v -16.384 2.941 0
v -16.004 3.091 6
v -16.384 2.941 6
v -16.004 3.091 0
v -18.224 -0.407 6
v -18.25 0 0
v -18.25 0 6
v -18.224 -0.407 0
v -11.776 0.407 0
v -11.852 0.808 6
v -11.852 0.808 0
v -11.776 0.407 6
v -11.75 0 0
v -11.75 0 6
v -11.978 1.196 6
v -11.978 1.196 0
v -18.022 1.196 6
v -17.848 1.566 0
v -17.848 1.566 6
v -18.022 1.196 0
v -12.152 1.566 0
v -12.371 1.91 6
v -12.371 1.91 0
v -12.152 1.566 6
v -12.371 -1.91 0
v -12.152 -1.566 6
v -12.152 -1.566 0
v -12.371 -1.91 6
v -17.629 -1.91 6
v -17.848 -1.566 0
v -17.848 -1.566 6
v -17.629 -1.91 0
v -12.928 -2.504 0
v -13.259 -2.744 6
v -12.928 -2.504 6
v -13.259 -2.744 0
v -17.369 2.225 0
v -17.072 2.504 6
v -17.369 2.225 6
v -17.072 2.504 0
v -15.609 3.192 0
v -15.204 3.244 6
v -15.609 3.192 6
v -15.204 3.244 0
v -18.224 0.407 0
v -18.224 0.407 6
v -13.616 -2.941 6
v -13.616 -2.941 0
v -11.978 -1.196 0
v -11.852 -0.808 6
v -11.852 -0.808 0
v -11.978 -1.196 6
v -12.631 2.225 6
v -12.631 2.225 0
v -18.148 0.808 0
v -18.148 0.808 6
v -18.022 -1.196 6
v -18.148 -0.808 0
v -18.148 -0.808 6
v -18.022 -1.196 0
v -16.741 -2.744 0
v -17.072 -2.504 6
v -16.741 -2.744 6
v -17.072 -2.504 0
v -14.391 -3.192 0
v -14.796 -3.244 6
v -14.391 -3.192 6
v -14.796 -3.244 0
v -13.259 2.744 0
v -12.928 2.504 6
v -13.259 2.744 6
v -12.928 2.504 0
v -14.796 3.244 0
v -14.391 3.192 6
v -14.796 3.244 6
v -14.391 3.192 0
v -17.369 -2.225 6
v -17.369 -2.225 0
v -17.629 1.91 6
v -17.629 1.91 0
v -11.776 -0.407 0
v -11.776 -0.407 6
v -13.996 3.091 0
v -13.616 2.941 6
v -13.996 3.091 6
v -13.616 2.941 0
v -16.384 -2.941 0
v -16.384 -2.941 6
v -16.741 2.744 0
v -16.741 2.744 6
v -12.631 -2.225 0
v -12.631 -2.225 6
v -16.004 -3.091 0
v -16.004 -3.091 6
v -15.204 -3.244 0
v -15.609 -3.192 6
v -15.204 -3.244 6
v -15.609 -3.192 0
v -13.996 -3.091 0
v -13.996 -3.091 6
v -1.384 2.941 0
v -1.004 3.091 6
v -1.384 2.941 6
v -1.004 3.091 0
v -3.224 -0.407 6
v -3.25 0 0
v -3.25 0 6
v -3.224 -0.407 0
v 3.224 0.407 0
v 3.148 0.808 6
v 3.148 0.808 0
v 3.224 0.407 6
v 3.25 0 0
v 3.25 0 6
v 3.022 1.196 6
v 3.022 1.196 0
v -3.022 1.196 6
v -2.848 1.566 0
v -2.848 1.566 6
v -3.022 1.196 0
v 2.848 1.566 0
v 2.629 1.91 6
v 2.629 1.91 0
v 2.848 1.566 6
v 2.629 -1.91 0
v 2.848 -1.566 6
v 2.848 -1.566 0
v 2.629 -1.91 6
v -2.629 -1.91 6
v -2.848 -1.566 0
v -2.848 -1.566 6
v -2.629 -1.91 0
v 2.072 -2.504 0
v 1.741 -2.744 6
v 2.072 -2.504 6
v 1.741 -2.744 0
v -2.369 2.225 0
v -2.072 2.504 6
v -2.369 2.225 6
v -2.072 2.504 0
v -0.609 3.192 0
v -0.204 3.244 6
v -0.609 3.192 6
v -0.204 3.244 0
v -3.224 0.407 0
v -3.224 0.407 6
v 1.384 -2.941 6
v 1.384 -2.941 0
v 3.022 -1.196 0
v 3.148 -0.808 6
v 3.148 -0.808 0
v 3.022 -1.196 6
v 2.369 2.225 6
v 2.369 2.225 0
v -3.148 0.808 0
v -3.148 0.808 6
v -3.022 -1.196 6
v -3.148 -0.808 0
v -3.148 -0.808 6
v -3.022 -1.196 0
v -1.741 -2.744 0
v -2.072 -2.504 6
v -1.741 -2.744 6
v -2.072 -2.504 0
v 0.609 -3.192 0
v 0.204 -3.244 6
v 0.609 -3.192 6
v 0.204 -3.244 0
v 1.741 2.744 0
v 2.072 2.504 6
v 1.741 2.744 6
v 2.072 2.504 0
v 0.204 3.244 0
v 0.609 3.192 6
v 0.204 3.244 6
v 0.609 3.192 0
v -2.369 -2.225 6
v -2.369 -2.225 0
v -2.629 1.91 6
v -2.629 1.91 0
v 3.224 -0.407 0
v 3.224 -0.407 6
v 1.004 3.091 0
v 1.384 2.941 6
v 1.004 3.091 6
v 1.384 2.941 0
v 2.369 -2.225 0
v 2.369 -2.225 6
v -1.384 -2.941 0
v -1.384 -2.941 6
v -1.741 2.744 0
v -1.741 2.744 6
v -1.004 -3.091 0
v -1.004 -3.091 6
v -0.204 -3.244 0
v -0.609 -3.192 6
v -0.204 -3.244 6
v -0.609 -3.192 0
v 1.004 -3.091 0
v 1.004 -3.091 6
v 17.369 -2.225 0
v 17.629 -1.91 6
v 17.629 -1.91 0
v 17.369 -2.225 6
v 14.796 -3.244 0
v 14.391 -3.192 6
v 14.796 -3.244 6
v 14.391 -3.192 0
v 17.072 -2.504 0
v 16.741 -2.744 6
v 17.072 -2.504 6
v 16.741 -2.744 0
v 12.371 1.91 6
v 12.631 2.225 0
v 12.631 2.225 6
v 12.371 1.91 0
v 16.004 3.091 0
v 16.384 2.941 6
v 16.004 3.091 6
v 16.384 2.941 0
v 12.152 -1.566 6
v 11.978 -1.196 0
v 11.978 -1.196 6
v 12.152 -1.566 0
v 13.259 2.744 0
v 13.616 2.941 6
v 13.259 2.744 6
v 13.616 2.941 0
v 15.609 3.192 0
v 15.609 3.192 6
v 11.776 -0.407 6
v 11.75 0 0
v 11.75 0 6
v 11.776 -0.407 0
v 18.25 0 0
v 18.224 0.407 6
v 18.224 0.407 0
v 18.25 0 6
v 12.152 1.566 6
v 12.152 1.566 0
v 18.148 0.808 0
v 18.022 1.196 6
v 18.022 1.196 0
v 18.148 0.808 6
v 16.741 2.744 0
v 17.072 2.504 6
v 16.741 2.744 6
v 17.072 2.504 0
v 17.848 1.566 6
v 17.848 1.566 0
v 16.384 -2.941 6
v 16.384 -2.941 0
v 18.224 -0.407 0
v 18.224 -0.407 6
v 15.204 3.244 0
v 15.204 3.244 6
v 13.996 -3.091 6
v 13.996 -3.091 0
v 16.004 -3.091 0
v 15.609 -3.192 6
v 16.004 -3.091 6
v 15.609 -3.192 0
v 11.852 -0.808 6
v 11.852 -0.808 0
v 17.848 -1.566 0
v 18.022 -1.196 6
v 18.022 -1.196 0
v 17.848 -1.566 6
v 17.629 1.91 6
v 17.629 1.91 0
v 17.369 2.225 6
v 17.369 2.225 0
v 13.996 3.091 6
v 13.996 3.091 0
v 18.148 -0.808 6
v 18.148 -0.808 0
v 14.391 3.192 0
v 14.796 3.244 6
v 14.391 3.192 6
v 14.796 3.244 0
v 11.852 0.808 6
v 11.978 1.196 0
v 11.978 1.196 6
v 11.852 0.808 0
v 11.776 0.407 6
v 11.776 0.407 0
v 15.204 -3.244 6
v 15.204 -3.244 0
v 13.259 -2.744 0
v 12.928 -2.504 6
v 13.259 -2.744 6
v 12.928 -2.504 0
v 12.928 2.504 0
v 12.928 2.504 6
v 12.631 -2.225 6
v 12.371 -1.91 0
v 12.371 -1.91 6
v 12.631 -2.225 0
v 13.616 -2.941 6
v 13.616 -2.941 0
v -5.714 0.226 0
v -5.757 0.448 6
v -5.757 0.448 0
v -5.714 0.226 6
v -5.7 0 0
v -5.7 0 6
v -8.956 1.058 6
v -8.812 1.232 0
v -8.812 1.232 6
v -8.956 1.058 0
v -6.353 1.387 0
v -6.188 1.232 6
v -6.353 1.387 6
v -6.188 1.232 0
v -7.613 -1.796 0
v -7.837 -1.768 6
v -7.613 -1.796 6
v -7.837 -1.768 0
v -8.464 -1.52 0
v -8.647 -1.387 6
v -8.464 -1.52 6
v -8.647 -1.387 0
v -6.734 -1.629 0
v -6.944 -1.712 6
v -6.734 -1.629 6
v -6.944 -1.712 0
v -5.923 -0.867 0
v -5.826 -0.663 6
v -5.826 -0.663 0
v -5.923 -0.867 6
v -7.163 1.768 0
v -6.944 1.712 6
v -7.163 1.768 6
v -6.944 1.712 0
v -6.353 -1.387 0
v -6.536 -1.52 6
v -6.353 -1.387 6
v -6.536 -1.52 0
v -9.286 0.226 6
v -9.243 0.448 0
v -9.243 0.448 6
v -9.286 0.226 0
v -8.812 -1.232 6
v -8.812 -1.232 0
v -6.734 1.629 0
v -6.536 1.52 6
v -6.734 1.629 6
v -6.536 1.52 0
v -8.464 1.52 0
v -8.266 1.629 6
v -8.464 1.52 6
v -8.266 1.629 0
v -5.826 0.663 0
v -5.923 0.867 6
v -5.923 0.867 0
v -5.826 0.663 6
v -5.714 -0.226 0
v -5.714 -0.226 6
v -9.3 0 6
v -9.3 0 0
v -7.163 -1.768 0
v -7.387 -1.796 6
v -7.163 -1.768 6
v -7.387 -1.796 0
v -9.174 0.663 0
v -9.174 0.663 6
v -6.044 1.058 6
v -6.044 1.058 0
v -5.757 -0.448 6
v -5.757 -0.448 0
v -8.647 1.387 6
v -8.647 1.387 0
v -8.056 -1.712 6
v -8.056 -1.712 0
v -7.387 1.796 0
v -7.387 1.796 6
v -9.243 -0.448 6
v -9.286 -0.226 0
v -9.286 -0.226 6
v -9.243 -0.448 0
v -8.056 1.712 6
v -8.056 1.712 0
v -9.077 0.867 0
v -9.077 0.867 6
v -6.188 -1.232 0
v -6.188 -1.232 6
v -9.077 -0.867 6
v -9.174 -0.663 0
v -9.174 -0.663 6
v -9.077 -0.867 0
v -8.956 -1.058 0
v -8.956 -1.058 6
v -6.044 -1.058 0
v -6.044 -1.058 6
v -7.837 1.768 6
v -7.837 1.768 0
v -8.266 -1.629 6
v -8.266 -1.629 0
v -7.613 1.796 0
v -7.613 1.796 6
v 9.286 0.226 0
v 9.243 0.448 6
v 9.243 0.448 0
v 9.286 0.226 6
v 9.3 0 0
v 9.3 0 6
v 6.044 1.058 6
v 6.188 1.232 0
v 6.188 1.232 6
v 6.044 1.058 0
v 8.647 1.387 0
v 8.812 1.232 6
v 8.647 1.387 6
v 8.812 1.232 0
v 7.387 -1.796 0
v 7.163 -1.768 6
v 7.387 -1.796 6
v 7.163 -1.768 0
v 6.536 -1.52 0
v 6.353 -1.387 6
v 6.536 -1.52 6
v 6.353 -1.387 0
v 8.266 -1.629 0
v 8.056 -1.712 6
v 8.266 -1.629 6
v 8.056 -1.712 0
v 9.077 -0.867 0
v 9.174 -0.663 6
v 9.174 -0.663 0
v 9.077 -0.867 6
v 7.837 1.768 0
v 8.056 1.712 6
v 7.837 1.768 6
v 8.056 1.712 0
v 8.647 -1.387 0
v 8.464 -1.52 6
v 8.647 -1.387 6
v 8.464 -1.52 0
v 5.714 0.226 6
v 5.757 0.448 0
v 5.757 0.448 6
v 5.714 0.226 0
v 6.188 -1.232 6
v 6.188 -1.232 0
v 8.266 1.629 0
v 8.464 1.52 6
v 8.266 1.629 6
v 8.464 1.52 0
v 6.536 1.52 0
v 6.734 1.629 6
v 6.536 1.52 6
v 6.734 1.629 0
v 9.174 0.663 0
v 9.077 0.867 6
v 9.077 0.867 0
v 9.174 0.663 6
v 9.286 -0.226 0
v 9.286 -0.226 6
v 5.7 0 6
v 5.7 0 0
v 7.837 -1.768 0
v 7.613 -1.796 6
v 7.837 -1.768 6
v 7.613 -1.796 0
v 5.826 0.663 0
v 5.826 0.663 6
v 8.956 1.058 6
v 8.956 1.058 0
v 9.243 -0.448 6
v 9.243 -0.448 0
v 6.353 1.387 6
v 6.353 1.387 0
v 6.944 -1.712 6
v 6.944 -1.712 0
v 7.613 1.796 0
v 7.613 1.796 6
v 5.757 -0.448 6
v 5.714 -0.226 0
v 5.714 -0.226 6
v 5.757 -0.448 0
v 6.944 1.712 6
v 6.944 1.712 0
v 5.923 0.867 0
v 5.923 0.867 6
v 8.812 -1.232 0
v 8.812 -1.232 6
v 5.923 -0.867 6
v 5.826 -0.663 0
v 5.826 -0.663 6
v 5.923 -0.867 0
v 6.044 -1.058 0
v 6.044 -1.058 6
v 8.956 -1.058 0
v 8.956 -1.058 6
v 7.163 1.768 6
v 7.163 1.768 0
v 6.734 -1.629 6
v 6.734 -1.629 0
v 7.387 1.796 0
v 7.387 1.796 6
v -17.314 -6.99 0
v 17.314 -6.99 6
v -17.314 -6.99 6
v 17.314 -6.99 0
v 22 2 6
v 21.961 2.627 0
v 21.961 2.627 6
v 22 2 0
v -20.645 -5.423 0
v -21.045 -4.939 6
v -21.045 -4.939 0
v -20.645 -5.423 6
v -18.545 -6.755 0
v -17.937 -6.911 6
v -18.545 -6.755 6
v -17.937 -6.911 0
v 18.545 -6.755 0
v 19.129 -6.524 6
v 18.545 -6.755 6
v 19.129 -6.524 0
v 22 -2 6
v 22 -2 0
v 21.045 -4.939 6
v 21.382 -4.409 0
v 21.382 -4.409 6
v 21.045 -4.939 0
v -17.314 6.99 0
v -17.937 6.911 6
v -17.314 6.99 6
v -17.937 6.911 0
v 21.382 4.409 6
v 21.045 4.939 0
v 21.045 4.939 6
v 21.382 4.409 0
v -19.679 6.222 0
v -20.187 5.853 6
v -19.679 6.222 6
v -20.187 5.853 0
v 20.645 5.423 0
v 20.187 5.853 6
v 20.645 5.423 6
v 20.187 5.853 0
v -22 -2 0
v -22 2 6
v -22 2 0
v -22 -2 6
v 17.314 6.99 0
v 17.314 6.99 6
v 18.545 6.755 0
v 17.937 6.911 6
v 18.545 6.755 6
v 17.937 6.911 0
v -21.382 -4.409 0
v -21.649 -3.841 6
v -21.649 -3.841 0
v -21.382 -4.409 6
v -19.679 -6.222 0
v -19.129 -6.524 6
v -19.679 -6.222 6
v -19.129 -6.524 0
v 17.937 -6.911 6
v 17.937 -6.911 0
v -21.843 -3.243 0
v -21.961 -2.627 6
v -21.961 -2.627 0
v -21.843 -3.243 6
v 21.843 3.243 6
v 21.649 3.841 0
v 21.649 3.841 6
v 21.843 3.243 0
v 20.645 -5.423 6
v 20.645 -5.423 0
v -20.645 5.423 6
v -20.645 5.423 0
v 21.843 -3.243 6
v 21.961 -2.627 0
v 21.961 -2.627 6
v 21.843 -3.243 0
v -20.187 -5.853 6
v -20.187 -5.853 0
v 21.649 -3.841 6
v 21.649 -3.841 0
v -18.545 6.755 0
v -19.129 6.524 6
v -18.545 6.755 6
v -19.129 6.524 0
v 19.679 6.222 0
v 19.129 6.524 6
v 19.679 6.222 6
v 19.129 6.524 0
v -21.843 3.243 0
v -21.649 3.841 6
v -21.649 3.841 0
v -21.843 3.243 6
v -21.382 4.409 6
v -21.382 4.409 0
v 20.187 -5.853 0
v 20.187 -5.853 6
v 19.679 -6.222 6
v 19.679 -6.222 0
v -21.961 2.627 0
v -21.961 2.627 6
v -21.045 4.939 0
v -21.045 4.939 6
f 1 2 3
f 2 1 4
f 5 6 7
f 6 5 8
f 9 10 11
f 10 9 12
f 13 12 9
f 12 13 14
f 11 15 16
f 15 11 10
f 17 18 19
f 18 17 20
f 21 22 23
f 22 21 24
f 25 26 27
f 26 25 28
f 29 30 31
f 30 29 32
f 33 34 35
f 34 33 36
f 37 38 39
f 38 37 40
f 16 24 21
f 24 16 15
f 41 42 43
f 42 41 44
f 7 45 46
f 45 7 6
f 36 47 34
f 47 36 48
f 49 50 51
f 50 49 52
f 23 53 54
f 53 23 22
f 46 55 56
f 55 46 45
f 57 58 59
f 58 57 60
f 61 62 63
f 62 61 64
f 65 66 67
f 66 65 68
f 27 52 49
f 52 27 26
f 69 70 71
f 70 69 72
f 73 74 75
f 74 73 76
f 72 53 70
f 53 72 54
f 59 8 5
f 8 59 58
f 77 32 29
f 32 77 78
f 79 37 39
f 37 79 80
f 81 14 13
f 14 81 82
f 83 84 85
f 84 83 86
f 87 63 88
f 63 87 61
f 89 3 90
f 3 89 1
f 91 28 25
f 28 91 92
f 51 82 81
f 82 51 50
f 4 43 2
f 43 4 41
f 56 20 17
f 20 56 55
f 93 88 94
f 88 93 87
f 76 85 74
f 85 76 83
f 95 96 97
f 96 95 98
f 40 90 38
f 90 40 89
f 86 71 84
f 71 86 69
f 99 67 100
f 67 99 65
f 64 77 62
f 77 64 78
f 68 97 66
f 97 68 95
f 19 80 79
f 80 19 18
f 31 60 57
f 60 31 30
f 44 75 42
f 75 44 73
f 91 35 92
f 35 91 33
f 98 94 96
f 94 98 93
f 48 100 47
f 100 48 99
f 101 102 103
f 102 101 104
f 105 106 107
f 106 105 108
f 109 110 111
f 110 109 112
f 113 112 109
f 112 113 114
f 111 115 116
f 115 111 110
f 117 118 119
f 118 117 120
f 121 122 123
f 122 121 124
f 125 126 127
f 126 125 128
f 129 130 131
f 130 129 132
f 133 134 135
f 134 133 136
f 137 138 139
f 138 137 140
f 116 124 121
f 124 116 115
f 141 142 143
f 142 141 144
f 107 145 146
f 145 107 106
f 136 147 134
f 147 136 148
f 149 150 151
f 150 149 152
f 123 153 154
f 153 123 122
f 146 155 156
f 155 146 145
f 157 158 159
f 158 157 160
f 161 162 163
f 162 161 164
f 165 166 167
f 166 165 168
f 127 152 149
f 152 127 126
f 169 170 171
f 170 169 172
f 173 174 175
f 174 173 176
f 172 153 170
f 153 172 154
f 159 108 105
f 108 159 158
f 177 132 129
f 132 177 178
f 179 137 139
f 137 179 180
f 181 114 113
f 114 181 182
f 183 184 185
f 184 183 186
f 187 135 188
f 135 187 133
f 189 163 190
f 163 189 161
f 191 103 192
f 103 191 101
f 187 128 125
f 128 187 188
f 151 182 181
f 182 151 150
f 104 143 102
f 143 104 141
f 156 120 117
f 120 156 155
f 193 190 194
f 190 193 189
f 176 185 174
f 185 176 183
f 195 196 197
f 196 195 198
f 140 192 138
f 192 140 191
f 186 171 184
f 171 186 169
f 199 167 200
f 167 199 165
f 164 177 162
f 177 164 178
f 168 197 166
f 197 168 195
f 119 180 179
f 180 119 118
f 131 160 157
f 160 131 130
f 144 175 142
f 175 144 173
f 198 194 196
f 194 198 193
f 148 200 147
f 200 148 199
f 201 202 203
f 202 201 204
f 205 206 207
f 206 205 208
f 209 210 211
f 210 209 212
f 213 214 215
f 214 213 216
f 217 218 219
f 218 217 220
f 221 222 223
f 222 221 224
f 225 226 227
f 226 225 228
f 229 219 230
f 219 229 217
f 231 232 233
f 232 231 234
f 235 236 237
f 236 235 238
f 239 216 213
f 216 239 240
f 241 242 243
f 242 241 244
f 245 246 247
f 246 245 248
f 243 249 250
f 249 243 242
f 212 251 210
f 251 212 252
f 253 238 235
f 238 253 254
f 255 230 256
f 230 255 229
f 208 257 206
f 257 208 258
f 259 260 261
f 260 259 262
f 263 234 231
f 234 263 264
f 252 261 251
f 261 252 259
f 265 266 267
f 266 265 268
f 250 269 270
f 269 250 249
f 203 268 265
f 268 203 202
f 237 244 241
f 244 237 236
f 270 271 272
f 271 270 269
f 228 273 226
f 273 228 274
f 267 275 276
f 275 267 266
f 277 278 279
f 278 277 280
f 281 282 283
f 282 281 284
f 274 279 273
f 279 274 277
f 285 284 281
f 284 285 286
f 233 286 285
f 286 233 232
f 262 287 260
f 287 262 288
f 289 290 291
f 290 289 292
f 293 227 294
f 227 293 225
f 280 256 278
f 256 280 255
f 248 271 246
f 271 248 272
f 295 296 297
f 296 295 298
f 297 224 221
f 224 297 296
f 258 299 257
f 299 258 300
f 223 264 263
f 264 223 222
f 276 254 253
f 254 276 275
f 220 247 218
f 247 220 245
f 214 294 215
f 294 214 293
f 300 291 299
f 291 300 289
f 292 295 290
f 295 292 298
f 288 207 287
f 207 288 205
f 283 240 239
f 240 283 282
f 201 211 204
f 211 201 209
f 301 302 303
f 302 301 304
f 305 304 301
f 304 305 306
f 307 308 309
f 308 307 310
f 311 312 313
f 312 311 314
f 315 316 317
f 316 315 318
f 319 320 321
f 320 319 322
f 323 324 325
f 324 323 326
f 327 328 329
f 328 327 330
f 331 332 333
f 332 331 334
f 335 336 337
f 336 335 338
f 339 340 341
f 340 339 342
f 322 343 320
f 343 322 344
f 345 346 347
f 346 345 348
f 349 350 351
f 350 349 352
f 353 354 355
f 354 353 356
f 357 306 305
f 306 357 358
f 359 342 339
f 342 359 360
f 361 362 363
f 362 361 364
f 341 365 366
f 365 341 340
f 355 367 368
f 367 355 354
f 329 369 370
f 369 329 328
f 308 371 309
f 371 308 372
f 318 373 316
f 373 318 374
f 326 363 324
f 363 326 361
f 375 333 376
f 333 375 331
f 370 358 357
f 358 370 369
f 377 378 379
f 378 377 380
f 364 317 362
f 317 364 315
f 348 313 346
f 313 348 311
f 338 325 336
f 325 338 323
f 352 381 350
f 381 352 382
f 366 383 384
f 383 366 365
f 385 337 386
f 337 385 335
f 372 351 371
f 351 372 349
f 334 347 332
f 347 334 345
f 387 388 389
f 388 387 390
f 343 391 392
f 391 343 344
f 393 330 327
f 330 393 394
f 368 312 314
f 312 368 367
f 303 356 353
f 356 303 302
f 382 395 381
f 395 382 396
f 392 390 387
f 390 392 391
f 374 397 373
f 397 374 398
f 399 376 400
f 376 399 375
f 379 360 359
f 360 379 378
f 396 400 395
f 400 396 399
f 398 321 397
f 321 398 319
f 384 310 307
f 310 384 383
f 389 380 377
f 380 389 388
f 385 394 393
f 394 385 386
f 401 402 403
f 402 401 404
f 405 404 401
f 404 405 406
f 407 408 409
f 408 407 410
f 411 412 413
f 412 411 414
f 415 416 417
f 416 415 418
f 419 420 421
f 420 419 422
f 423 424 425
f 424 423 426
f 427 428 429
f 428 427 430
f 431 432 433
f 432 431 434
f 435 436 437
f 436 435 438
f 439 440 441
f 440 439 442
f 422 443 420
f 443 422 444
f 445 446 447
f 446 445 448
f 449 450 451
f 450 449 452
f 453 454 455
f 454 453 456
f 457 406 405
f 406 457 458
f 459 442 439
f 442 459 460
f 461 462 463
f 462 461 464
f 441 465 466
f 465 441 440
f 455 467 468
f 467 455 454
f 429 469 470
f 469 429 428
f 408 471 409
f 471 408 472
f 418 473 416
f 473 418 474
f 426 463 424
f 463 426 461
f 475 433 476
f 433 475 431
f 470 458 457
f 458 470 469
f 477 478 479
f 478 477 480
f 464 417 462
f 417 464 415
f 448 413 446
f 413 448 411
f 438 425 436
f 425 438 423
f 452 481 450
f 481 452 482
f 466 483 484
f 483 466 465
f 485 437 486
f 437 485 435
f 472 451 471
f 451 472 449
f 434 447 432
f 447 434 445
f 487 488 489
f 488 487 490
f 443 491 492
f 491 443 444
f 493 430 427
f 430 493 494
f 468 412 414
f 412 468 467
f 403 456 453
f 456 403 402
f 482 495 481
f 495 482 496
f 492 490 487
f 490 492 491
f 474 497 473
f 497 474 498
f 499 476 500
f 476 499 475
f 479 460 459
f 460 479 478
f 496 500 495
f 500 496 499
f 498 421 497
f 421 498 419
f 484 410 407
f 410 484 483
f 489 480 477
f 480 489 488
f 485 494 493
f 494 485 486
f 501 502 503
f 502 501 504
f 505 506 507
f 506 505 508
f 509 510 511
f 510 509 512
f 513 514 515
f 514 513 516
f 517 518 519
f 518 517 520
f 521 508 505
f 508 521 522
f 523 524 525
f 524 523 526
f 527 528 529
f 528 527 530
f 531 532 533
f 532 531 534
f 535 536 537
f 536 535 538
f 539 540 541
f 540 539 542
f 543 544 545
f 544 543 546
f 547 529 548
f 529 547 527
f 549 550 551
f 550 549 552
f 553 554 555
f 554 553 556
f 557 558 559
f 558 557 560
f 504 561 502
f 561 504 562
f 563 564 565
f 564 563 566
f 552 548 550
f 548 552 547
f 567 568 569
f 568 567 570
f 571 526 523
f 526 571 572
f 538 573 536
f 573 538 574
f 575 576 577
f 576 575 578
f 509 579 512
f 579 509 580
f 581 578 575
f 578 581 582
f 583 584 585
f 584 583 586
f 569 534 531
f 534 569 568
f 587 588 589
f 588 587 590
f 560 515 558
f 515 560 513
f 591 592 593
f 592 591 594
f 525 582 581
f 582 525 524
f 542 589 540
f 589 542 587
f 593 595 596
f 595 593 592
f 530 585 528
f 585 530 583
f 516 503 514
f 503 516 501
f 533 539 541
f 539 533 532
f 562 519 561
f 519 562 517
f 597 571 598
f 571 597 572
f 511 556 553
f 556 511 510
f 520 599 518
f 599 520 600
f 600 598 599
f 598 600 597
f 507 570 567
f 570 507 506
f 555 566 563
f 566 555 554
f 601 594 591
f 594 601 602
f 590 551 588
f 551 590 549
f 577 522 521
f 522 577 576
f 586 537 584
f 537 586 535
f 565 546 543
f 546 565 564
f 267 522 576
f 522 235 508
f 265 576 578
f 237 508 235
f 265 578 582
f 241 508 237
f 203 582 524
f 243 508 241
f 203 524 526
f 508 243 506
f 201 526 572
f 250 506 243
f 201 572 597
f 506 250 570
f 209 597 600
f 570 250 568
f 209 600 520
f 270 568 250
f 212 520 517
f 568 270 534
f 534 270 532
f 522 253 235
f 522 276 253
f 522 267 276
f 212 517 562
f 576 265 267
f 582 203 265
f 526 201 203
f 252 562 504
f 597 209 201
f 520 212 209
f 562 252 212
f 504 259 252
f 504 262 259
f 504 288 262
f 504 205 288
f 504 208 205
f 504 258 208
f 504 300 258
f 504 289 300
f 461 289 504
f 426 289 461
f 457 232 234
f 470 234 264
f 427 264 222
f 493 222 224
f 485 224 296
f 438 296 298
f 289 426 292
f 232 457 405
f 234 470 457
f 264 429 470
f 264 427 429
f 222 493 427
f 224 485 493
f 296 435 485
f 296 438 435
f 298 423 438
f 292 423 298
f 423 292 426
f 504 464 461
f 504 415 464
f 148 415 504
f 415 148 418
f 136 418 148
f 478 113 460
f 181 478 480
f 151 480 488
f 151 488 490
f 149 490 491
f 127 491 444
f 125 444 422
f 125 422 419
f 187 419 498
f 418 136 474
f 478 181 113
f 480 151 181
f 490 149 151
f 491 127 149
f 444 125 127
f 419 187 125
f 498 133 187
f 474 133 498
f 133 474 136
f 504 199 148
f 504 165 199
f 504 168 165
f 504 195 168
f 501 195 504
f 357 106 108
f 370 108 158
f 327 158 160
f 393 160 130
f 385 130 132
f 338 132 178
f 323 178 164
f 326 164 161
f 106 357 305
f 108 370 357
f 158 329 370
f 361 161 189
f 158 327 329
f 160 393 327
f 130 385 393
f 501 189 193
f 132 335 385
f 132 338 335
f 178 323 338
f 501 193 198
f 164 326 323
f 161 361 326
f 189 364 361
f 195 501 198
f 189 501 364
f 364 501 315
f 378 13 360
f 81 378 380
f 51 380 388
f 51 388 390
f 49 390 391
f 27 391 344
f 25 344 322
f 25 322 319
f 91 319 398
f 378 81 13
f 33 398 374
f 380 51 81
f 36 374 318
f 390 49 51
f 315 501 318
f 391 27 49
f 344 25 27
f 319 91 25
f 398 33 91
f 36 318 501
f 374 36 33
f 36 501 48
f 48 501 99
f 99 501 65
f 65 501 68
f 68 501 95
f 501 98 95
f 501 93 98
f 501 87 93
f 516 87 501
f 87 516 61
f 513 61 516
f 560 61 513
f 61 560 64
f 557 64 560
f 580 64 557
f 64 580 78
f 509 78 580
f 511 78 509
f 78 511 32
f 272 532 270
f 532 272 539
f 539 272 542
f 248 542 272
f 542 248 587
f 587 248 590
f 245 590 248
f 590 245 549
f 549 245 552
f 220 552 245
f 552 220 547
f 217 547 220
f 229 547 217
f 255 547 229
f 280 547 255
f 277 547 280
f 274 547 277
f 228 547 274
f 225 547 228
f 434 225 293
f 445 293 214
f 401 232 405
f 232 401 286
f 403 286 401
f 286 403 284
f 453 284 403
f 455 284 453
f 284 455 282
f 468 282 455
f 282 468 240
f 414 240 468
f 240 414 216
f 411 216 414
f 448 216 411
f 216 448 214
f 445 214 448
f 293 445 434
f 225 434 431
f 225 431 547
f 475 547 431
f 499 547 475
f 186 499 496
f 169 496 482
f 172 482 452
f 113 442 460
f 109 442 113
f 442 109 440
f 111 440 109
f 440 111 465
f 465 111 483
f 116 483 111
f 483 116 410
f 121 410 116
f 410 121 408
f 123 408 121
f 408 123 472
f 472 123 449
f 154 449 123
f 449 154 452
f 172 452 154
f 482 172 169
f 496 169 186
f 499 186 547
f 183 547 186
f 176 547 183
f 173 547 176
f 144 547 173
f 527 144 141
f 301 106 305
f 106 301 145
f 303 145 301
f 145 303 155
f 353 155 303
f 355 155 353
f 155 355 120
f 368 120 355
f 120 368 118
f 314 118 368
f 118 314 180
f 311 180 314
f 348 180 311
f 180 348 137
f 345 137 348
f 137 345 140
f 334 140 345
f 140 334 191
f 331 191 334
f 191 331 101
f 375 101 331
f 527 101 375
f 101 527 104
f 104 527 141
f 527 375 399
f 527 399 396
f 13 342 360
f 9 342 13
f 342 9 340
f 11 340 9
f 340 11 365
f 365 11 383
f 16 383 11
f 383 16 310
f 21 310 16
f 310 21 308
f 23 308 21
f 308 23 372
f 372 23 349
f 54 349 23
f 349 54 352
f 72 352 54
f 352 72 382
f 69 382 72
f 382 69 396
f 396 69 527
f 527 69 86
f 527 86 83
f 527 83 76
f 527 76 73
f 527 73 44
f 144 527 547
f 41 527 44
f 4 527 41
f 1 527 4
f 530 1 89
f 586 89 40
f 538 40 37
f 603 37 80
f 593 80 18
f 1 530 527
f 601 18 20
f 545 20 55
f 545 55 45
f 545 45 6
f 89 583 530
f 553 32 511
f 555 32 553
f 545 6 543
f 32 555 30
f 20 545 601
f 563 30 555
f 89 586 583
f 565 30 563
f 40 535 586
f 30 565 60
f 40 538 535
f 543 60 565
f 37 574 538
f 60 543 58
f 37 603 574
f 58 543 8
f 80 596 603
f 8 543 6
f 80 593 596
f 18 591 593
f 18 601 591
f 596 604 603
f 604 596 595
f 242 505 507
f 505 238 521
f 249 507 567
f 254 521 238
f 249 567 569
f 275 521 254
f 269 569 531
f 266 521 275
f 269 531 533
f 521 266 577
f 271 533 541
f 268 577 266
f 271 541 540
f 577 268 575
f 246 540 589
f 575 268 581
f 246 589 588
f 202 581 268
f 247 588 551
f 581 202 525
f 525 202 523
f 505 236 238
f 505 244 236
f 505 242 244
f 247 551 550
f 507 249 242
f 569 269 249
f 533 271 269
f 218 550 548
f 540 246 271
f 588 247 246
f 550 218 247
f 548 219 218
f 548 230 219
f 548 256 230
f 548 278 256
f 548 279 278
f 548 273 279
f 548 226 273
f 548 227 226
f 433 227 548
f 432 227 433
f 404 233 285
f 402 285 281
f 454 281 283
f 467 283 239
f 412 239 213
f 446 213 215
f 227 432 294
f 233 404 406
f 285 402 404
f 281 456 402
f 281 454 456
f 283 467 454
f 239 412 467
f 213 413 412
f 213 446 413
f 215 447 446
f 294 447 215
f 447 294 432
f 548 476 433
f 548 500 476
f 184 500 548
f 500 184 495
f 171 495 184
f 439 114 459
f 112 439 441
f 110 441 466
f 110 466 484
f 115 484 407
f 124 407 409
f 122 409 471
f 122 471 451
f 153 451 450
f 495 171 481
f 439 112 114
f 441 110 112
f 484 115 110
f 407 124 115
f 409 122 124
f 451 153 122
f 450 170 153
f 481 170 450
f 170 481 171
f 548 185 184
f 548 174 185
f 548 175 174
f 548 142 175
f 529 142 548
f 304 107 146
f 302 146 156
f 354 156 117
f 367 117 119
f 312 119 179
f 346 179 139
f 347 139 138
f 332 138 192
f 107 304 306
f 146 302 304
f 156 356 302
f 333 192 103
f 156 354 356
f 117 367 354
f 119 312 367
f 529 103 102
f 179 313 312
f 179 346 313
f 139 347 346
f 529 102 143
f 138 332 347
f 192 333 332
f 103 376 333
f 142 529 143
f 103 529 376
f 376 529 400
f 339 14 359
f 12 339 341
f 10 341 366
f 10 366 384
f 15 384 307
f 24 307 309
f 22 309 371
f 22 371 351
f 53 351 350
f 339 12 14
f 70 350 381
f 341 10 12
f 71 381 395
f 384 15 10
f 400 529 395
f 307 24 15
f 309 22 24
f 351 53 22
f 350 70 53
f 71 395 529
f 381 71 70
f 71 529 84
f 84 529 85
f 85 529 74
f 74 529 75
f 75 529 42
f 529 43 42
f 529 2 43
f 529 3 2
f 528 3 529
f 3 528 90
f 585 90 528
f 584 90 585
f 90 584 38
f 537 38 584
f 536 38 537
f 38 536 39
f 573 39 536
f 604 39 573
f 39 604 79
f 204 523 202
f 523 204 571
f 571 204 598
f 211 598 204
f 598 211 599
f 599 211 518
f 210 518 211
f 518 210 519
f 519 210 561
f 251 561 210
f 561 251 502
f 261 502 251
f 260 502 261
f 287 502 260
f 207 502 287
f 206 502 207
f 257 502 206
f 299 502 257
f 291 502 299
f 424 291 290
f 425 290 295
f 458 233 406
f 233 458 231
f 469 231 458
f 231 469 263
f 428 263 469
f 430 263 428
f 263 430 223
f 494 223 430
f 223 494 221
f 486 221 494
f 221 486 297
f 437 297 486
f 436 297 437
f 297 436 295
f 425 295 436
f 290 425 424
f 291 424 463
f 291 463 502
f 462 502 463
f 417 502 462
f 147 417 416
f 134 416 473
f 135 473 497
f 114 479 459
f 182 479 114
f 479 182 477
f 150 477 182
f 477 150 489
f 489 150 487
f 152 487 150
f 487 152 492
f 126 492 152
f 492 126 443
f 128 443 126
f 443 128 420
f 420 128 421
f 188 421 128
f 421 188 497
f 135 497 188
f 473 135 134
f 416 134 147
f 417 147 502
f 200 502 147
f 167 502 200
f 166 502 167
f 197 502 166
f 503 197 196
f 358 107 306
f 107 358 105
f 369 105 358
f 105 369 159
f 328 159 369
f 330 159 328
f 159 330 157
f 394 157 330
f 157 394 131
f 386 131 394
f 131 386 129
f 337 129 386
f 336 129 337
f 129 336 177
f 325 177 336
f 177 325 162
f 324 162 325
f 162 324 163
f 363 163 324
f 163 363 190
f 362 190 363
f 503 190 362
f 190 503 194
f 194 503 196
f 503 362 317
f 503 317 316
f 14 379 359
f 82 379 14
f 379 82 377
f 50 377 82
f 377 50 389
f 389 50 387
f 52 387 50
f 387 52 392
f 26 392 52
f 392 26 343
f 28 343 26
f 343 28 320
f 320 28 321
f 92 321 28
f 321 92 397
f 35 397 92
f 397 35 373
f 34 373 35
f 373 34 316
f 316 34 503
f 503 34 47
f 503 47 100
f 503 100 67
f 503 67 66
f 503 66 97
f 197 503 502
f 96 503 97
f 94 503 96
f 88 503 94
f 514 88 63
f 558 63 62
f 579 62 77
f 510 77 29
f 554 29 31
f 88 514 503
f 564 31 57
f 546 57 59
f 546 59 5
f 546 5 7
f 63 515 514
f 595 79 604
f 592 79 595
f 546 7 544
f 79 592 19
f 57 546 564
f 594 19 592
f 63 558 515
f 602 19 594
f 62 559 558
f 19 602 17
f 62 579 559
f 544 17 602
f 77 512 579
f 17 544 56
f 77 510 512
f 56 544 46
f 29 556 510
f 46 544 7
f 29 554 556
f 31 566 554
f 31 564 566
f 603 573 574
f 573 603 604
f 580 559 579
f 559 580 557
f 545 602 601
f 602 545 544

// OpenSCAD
$fn = 50;


difference() {
	union() {
		hull() {
			translate(v = [-17.0000000000, 2.0000000000, 0]) {
				cylinder(h = 6, r = 5);
			}
			translate(v = [17.0000000000, 2.0000000000, 0]) {
				cylinder(h = 6, r = 5);
			}
			translate(v = [-17.0000000000, -2.0000000000, 0]) {
				cylinder(h = 6, r = 5);
			}
			translate(v = [17.0000000000, -2.0000000000, 0]) {
				cylinder(h = 6, r = 5);
			}
		}
	}
	union() {
		translate(v = [-15.0000000000, 0.0000000000, 0]) {
			translate(v = [0, 0, -100]) {
				cylinder(h = 200, r = 3.2500000000);
			}
		}
		translate(v = [0, 0, -100]) {
			cylinder(h = 200, r = 3.2500000000);
		}
		translate(v = [15.0000000000, 0.0000000000, 0]) {
			translate(v = [0, 0, -100]) {
				cylinder(h = 200, r = 3.2500000000);
			}
		}
		translate(v = [-15.0000000000, 0.0000000000, 0]) {
			translate(v = [0, 0, -100]) {
				cylinder(h = 200, r = 1.8000000000);
			}
		}
		translate(v = [-7.5000000000, 0.0000000000, 0]) {
			translate(v = [0, 0, -100]) {
				cylinder(h = 200, r = 1.8000000000);
			}
		}
		translate(v = [0, 0, -100]) {
			cylinder(h = 200, r = 1.8000000000);
		}
		translate(v = [7.5000000000, 0.0000000000, 0]) {
			translate(v = [0, 0, -100]) {
				cylinder(h = 200, r = 1.8000000000);
			}
		}
		translate(v = [15.0000000000, 0.0000000000, 0]) {
			translate(v = [0, 0, -100]) {
				cylinder(h = 200, r = 1.8000000000);
			}
		}
	}
}
